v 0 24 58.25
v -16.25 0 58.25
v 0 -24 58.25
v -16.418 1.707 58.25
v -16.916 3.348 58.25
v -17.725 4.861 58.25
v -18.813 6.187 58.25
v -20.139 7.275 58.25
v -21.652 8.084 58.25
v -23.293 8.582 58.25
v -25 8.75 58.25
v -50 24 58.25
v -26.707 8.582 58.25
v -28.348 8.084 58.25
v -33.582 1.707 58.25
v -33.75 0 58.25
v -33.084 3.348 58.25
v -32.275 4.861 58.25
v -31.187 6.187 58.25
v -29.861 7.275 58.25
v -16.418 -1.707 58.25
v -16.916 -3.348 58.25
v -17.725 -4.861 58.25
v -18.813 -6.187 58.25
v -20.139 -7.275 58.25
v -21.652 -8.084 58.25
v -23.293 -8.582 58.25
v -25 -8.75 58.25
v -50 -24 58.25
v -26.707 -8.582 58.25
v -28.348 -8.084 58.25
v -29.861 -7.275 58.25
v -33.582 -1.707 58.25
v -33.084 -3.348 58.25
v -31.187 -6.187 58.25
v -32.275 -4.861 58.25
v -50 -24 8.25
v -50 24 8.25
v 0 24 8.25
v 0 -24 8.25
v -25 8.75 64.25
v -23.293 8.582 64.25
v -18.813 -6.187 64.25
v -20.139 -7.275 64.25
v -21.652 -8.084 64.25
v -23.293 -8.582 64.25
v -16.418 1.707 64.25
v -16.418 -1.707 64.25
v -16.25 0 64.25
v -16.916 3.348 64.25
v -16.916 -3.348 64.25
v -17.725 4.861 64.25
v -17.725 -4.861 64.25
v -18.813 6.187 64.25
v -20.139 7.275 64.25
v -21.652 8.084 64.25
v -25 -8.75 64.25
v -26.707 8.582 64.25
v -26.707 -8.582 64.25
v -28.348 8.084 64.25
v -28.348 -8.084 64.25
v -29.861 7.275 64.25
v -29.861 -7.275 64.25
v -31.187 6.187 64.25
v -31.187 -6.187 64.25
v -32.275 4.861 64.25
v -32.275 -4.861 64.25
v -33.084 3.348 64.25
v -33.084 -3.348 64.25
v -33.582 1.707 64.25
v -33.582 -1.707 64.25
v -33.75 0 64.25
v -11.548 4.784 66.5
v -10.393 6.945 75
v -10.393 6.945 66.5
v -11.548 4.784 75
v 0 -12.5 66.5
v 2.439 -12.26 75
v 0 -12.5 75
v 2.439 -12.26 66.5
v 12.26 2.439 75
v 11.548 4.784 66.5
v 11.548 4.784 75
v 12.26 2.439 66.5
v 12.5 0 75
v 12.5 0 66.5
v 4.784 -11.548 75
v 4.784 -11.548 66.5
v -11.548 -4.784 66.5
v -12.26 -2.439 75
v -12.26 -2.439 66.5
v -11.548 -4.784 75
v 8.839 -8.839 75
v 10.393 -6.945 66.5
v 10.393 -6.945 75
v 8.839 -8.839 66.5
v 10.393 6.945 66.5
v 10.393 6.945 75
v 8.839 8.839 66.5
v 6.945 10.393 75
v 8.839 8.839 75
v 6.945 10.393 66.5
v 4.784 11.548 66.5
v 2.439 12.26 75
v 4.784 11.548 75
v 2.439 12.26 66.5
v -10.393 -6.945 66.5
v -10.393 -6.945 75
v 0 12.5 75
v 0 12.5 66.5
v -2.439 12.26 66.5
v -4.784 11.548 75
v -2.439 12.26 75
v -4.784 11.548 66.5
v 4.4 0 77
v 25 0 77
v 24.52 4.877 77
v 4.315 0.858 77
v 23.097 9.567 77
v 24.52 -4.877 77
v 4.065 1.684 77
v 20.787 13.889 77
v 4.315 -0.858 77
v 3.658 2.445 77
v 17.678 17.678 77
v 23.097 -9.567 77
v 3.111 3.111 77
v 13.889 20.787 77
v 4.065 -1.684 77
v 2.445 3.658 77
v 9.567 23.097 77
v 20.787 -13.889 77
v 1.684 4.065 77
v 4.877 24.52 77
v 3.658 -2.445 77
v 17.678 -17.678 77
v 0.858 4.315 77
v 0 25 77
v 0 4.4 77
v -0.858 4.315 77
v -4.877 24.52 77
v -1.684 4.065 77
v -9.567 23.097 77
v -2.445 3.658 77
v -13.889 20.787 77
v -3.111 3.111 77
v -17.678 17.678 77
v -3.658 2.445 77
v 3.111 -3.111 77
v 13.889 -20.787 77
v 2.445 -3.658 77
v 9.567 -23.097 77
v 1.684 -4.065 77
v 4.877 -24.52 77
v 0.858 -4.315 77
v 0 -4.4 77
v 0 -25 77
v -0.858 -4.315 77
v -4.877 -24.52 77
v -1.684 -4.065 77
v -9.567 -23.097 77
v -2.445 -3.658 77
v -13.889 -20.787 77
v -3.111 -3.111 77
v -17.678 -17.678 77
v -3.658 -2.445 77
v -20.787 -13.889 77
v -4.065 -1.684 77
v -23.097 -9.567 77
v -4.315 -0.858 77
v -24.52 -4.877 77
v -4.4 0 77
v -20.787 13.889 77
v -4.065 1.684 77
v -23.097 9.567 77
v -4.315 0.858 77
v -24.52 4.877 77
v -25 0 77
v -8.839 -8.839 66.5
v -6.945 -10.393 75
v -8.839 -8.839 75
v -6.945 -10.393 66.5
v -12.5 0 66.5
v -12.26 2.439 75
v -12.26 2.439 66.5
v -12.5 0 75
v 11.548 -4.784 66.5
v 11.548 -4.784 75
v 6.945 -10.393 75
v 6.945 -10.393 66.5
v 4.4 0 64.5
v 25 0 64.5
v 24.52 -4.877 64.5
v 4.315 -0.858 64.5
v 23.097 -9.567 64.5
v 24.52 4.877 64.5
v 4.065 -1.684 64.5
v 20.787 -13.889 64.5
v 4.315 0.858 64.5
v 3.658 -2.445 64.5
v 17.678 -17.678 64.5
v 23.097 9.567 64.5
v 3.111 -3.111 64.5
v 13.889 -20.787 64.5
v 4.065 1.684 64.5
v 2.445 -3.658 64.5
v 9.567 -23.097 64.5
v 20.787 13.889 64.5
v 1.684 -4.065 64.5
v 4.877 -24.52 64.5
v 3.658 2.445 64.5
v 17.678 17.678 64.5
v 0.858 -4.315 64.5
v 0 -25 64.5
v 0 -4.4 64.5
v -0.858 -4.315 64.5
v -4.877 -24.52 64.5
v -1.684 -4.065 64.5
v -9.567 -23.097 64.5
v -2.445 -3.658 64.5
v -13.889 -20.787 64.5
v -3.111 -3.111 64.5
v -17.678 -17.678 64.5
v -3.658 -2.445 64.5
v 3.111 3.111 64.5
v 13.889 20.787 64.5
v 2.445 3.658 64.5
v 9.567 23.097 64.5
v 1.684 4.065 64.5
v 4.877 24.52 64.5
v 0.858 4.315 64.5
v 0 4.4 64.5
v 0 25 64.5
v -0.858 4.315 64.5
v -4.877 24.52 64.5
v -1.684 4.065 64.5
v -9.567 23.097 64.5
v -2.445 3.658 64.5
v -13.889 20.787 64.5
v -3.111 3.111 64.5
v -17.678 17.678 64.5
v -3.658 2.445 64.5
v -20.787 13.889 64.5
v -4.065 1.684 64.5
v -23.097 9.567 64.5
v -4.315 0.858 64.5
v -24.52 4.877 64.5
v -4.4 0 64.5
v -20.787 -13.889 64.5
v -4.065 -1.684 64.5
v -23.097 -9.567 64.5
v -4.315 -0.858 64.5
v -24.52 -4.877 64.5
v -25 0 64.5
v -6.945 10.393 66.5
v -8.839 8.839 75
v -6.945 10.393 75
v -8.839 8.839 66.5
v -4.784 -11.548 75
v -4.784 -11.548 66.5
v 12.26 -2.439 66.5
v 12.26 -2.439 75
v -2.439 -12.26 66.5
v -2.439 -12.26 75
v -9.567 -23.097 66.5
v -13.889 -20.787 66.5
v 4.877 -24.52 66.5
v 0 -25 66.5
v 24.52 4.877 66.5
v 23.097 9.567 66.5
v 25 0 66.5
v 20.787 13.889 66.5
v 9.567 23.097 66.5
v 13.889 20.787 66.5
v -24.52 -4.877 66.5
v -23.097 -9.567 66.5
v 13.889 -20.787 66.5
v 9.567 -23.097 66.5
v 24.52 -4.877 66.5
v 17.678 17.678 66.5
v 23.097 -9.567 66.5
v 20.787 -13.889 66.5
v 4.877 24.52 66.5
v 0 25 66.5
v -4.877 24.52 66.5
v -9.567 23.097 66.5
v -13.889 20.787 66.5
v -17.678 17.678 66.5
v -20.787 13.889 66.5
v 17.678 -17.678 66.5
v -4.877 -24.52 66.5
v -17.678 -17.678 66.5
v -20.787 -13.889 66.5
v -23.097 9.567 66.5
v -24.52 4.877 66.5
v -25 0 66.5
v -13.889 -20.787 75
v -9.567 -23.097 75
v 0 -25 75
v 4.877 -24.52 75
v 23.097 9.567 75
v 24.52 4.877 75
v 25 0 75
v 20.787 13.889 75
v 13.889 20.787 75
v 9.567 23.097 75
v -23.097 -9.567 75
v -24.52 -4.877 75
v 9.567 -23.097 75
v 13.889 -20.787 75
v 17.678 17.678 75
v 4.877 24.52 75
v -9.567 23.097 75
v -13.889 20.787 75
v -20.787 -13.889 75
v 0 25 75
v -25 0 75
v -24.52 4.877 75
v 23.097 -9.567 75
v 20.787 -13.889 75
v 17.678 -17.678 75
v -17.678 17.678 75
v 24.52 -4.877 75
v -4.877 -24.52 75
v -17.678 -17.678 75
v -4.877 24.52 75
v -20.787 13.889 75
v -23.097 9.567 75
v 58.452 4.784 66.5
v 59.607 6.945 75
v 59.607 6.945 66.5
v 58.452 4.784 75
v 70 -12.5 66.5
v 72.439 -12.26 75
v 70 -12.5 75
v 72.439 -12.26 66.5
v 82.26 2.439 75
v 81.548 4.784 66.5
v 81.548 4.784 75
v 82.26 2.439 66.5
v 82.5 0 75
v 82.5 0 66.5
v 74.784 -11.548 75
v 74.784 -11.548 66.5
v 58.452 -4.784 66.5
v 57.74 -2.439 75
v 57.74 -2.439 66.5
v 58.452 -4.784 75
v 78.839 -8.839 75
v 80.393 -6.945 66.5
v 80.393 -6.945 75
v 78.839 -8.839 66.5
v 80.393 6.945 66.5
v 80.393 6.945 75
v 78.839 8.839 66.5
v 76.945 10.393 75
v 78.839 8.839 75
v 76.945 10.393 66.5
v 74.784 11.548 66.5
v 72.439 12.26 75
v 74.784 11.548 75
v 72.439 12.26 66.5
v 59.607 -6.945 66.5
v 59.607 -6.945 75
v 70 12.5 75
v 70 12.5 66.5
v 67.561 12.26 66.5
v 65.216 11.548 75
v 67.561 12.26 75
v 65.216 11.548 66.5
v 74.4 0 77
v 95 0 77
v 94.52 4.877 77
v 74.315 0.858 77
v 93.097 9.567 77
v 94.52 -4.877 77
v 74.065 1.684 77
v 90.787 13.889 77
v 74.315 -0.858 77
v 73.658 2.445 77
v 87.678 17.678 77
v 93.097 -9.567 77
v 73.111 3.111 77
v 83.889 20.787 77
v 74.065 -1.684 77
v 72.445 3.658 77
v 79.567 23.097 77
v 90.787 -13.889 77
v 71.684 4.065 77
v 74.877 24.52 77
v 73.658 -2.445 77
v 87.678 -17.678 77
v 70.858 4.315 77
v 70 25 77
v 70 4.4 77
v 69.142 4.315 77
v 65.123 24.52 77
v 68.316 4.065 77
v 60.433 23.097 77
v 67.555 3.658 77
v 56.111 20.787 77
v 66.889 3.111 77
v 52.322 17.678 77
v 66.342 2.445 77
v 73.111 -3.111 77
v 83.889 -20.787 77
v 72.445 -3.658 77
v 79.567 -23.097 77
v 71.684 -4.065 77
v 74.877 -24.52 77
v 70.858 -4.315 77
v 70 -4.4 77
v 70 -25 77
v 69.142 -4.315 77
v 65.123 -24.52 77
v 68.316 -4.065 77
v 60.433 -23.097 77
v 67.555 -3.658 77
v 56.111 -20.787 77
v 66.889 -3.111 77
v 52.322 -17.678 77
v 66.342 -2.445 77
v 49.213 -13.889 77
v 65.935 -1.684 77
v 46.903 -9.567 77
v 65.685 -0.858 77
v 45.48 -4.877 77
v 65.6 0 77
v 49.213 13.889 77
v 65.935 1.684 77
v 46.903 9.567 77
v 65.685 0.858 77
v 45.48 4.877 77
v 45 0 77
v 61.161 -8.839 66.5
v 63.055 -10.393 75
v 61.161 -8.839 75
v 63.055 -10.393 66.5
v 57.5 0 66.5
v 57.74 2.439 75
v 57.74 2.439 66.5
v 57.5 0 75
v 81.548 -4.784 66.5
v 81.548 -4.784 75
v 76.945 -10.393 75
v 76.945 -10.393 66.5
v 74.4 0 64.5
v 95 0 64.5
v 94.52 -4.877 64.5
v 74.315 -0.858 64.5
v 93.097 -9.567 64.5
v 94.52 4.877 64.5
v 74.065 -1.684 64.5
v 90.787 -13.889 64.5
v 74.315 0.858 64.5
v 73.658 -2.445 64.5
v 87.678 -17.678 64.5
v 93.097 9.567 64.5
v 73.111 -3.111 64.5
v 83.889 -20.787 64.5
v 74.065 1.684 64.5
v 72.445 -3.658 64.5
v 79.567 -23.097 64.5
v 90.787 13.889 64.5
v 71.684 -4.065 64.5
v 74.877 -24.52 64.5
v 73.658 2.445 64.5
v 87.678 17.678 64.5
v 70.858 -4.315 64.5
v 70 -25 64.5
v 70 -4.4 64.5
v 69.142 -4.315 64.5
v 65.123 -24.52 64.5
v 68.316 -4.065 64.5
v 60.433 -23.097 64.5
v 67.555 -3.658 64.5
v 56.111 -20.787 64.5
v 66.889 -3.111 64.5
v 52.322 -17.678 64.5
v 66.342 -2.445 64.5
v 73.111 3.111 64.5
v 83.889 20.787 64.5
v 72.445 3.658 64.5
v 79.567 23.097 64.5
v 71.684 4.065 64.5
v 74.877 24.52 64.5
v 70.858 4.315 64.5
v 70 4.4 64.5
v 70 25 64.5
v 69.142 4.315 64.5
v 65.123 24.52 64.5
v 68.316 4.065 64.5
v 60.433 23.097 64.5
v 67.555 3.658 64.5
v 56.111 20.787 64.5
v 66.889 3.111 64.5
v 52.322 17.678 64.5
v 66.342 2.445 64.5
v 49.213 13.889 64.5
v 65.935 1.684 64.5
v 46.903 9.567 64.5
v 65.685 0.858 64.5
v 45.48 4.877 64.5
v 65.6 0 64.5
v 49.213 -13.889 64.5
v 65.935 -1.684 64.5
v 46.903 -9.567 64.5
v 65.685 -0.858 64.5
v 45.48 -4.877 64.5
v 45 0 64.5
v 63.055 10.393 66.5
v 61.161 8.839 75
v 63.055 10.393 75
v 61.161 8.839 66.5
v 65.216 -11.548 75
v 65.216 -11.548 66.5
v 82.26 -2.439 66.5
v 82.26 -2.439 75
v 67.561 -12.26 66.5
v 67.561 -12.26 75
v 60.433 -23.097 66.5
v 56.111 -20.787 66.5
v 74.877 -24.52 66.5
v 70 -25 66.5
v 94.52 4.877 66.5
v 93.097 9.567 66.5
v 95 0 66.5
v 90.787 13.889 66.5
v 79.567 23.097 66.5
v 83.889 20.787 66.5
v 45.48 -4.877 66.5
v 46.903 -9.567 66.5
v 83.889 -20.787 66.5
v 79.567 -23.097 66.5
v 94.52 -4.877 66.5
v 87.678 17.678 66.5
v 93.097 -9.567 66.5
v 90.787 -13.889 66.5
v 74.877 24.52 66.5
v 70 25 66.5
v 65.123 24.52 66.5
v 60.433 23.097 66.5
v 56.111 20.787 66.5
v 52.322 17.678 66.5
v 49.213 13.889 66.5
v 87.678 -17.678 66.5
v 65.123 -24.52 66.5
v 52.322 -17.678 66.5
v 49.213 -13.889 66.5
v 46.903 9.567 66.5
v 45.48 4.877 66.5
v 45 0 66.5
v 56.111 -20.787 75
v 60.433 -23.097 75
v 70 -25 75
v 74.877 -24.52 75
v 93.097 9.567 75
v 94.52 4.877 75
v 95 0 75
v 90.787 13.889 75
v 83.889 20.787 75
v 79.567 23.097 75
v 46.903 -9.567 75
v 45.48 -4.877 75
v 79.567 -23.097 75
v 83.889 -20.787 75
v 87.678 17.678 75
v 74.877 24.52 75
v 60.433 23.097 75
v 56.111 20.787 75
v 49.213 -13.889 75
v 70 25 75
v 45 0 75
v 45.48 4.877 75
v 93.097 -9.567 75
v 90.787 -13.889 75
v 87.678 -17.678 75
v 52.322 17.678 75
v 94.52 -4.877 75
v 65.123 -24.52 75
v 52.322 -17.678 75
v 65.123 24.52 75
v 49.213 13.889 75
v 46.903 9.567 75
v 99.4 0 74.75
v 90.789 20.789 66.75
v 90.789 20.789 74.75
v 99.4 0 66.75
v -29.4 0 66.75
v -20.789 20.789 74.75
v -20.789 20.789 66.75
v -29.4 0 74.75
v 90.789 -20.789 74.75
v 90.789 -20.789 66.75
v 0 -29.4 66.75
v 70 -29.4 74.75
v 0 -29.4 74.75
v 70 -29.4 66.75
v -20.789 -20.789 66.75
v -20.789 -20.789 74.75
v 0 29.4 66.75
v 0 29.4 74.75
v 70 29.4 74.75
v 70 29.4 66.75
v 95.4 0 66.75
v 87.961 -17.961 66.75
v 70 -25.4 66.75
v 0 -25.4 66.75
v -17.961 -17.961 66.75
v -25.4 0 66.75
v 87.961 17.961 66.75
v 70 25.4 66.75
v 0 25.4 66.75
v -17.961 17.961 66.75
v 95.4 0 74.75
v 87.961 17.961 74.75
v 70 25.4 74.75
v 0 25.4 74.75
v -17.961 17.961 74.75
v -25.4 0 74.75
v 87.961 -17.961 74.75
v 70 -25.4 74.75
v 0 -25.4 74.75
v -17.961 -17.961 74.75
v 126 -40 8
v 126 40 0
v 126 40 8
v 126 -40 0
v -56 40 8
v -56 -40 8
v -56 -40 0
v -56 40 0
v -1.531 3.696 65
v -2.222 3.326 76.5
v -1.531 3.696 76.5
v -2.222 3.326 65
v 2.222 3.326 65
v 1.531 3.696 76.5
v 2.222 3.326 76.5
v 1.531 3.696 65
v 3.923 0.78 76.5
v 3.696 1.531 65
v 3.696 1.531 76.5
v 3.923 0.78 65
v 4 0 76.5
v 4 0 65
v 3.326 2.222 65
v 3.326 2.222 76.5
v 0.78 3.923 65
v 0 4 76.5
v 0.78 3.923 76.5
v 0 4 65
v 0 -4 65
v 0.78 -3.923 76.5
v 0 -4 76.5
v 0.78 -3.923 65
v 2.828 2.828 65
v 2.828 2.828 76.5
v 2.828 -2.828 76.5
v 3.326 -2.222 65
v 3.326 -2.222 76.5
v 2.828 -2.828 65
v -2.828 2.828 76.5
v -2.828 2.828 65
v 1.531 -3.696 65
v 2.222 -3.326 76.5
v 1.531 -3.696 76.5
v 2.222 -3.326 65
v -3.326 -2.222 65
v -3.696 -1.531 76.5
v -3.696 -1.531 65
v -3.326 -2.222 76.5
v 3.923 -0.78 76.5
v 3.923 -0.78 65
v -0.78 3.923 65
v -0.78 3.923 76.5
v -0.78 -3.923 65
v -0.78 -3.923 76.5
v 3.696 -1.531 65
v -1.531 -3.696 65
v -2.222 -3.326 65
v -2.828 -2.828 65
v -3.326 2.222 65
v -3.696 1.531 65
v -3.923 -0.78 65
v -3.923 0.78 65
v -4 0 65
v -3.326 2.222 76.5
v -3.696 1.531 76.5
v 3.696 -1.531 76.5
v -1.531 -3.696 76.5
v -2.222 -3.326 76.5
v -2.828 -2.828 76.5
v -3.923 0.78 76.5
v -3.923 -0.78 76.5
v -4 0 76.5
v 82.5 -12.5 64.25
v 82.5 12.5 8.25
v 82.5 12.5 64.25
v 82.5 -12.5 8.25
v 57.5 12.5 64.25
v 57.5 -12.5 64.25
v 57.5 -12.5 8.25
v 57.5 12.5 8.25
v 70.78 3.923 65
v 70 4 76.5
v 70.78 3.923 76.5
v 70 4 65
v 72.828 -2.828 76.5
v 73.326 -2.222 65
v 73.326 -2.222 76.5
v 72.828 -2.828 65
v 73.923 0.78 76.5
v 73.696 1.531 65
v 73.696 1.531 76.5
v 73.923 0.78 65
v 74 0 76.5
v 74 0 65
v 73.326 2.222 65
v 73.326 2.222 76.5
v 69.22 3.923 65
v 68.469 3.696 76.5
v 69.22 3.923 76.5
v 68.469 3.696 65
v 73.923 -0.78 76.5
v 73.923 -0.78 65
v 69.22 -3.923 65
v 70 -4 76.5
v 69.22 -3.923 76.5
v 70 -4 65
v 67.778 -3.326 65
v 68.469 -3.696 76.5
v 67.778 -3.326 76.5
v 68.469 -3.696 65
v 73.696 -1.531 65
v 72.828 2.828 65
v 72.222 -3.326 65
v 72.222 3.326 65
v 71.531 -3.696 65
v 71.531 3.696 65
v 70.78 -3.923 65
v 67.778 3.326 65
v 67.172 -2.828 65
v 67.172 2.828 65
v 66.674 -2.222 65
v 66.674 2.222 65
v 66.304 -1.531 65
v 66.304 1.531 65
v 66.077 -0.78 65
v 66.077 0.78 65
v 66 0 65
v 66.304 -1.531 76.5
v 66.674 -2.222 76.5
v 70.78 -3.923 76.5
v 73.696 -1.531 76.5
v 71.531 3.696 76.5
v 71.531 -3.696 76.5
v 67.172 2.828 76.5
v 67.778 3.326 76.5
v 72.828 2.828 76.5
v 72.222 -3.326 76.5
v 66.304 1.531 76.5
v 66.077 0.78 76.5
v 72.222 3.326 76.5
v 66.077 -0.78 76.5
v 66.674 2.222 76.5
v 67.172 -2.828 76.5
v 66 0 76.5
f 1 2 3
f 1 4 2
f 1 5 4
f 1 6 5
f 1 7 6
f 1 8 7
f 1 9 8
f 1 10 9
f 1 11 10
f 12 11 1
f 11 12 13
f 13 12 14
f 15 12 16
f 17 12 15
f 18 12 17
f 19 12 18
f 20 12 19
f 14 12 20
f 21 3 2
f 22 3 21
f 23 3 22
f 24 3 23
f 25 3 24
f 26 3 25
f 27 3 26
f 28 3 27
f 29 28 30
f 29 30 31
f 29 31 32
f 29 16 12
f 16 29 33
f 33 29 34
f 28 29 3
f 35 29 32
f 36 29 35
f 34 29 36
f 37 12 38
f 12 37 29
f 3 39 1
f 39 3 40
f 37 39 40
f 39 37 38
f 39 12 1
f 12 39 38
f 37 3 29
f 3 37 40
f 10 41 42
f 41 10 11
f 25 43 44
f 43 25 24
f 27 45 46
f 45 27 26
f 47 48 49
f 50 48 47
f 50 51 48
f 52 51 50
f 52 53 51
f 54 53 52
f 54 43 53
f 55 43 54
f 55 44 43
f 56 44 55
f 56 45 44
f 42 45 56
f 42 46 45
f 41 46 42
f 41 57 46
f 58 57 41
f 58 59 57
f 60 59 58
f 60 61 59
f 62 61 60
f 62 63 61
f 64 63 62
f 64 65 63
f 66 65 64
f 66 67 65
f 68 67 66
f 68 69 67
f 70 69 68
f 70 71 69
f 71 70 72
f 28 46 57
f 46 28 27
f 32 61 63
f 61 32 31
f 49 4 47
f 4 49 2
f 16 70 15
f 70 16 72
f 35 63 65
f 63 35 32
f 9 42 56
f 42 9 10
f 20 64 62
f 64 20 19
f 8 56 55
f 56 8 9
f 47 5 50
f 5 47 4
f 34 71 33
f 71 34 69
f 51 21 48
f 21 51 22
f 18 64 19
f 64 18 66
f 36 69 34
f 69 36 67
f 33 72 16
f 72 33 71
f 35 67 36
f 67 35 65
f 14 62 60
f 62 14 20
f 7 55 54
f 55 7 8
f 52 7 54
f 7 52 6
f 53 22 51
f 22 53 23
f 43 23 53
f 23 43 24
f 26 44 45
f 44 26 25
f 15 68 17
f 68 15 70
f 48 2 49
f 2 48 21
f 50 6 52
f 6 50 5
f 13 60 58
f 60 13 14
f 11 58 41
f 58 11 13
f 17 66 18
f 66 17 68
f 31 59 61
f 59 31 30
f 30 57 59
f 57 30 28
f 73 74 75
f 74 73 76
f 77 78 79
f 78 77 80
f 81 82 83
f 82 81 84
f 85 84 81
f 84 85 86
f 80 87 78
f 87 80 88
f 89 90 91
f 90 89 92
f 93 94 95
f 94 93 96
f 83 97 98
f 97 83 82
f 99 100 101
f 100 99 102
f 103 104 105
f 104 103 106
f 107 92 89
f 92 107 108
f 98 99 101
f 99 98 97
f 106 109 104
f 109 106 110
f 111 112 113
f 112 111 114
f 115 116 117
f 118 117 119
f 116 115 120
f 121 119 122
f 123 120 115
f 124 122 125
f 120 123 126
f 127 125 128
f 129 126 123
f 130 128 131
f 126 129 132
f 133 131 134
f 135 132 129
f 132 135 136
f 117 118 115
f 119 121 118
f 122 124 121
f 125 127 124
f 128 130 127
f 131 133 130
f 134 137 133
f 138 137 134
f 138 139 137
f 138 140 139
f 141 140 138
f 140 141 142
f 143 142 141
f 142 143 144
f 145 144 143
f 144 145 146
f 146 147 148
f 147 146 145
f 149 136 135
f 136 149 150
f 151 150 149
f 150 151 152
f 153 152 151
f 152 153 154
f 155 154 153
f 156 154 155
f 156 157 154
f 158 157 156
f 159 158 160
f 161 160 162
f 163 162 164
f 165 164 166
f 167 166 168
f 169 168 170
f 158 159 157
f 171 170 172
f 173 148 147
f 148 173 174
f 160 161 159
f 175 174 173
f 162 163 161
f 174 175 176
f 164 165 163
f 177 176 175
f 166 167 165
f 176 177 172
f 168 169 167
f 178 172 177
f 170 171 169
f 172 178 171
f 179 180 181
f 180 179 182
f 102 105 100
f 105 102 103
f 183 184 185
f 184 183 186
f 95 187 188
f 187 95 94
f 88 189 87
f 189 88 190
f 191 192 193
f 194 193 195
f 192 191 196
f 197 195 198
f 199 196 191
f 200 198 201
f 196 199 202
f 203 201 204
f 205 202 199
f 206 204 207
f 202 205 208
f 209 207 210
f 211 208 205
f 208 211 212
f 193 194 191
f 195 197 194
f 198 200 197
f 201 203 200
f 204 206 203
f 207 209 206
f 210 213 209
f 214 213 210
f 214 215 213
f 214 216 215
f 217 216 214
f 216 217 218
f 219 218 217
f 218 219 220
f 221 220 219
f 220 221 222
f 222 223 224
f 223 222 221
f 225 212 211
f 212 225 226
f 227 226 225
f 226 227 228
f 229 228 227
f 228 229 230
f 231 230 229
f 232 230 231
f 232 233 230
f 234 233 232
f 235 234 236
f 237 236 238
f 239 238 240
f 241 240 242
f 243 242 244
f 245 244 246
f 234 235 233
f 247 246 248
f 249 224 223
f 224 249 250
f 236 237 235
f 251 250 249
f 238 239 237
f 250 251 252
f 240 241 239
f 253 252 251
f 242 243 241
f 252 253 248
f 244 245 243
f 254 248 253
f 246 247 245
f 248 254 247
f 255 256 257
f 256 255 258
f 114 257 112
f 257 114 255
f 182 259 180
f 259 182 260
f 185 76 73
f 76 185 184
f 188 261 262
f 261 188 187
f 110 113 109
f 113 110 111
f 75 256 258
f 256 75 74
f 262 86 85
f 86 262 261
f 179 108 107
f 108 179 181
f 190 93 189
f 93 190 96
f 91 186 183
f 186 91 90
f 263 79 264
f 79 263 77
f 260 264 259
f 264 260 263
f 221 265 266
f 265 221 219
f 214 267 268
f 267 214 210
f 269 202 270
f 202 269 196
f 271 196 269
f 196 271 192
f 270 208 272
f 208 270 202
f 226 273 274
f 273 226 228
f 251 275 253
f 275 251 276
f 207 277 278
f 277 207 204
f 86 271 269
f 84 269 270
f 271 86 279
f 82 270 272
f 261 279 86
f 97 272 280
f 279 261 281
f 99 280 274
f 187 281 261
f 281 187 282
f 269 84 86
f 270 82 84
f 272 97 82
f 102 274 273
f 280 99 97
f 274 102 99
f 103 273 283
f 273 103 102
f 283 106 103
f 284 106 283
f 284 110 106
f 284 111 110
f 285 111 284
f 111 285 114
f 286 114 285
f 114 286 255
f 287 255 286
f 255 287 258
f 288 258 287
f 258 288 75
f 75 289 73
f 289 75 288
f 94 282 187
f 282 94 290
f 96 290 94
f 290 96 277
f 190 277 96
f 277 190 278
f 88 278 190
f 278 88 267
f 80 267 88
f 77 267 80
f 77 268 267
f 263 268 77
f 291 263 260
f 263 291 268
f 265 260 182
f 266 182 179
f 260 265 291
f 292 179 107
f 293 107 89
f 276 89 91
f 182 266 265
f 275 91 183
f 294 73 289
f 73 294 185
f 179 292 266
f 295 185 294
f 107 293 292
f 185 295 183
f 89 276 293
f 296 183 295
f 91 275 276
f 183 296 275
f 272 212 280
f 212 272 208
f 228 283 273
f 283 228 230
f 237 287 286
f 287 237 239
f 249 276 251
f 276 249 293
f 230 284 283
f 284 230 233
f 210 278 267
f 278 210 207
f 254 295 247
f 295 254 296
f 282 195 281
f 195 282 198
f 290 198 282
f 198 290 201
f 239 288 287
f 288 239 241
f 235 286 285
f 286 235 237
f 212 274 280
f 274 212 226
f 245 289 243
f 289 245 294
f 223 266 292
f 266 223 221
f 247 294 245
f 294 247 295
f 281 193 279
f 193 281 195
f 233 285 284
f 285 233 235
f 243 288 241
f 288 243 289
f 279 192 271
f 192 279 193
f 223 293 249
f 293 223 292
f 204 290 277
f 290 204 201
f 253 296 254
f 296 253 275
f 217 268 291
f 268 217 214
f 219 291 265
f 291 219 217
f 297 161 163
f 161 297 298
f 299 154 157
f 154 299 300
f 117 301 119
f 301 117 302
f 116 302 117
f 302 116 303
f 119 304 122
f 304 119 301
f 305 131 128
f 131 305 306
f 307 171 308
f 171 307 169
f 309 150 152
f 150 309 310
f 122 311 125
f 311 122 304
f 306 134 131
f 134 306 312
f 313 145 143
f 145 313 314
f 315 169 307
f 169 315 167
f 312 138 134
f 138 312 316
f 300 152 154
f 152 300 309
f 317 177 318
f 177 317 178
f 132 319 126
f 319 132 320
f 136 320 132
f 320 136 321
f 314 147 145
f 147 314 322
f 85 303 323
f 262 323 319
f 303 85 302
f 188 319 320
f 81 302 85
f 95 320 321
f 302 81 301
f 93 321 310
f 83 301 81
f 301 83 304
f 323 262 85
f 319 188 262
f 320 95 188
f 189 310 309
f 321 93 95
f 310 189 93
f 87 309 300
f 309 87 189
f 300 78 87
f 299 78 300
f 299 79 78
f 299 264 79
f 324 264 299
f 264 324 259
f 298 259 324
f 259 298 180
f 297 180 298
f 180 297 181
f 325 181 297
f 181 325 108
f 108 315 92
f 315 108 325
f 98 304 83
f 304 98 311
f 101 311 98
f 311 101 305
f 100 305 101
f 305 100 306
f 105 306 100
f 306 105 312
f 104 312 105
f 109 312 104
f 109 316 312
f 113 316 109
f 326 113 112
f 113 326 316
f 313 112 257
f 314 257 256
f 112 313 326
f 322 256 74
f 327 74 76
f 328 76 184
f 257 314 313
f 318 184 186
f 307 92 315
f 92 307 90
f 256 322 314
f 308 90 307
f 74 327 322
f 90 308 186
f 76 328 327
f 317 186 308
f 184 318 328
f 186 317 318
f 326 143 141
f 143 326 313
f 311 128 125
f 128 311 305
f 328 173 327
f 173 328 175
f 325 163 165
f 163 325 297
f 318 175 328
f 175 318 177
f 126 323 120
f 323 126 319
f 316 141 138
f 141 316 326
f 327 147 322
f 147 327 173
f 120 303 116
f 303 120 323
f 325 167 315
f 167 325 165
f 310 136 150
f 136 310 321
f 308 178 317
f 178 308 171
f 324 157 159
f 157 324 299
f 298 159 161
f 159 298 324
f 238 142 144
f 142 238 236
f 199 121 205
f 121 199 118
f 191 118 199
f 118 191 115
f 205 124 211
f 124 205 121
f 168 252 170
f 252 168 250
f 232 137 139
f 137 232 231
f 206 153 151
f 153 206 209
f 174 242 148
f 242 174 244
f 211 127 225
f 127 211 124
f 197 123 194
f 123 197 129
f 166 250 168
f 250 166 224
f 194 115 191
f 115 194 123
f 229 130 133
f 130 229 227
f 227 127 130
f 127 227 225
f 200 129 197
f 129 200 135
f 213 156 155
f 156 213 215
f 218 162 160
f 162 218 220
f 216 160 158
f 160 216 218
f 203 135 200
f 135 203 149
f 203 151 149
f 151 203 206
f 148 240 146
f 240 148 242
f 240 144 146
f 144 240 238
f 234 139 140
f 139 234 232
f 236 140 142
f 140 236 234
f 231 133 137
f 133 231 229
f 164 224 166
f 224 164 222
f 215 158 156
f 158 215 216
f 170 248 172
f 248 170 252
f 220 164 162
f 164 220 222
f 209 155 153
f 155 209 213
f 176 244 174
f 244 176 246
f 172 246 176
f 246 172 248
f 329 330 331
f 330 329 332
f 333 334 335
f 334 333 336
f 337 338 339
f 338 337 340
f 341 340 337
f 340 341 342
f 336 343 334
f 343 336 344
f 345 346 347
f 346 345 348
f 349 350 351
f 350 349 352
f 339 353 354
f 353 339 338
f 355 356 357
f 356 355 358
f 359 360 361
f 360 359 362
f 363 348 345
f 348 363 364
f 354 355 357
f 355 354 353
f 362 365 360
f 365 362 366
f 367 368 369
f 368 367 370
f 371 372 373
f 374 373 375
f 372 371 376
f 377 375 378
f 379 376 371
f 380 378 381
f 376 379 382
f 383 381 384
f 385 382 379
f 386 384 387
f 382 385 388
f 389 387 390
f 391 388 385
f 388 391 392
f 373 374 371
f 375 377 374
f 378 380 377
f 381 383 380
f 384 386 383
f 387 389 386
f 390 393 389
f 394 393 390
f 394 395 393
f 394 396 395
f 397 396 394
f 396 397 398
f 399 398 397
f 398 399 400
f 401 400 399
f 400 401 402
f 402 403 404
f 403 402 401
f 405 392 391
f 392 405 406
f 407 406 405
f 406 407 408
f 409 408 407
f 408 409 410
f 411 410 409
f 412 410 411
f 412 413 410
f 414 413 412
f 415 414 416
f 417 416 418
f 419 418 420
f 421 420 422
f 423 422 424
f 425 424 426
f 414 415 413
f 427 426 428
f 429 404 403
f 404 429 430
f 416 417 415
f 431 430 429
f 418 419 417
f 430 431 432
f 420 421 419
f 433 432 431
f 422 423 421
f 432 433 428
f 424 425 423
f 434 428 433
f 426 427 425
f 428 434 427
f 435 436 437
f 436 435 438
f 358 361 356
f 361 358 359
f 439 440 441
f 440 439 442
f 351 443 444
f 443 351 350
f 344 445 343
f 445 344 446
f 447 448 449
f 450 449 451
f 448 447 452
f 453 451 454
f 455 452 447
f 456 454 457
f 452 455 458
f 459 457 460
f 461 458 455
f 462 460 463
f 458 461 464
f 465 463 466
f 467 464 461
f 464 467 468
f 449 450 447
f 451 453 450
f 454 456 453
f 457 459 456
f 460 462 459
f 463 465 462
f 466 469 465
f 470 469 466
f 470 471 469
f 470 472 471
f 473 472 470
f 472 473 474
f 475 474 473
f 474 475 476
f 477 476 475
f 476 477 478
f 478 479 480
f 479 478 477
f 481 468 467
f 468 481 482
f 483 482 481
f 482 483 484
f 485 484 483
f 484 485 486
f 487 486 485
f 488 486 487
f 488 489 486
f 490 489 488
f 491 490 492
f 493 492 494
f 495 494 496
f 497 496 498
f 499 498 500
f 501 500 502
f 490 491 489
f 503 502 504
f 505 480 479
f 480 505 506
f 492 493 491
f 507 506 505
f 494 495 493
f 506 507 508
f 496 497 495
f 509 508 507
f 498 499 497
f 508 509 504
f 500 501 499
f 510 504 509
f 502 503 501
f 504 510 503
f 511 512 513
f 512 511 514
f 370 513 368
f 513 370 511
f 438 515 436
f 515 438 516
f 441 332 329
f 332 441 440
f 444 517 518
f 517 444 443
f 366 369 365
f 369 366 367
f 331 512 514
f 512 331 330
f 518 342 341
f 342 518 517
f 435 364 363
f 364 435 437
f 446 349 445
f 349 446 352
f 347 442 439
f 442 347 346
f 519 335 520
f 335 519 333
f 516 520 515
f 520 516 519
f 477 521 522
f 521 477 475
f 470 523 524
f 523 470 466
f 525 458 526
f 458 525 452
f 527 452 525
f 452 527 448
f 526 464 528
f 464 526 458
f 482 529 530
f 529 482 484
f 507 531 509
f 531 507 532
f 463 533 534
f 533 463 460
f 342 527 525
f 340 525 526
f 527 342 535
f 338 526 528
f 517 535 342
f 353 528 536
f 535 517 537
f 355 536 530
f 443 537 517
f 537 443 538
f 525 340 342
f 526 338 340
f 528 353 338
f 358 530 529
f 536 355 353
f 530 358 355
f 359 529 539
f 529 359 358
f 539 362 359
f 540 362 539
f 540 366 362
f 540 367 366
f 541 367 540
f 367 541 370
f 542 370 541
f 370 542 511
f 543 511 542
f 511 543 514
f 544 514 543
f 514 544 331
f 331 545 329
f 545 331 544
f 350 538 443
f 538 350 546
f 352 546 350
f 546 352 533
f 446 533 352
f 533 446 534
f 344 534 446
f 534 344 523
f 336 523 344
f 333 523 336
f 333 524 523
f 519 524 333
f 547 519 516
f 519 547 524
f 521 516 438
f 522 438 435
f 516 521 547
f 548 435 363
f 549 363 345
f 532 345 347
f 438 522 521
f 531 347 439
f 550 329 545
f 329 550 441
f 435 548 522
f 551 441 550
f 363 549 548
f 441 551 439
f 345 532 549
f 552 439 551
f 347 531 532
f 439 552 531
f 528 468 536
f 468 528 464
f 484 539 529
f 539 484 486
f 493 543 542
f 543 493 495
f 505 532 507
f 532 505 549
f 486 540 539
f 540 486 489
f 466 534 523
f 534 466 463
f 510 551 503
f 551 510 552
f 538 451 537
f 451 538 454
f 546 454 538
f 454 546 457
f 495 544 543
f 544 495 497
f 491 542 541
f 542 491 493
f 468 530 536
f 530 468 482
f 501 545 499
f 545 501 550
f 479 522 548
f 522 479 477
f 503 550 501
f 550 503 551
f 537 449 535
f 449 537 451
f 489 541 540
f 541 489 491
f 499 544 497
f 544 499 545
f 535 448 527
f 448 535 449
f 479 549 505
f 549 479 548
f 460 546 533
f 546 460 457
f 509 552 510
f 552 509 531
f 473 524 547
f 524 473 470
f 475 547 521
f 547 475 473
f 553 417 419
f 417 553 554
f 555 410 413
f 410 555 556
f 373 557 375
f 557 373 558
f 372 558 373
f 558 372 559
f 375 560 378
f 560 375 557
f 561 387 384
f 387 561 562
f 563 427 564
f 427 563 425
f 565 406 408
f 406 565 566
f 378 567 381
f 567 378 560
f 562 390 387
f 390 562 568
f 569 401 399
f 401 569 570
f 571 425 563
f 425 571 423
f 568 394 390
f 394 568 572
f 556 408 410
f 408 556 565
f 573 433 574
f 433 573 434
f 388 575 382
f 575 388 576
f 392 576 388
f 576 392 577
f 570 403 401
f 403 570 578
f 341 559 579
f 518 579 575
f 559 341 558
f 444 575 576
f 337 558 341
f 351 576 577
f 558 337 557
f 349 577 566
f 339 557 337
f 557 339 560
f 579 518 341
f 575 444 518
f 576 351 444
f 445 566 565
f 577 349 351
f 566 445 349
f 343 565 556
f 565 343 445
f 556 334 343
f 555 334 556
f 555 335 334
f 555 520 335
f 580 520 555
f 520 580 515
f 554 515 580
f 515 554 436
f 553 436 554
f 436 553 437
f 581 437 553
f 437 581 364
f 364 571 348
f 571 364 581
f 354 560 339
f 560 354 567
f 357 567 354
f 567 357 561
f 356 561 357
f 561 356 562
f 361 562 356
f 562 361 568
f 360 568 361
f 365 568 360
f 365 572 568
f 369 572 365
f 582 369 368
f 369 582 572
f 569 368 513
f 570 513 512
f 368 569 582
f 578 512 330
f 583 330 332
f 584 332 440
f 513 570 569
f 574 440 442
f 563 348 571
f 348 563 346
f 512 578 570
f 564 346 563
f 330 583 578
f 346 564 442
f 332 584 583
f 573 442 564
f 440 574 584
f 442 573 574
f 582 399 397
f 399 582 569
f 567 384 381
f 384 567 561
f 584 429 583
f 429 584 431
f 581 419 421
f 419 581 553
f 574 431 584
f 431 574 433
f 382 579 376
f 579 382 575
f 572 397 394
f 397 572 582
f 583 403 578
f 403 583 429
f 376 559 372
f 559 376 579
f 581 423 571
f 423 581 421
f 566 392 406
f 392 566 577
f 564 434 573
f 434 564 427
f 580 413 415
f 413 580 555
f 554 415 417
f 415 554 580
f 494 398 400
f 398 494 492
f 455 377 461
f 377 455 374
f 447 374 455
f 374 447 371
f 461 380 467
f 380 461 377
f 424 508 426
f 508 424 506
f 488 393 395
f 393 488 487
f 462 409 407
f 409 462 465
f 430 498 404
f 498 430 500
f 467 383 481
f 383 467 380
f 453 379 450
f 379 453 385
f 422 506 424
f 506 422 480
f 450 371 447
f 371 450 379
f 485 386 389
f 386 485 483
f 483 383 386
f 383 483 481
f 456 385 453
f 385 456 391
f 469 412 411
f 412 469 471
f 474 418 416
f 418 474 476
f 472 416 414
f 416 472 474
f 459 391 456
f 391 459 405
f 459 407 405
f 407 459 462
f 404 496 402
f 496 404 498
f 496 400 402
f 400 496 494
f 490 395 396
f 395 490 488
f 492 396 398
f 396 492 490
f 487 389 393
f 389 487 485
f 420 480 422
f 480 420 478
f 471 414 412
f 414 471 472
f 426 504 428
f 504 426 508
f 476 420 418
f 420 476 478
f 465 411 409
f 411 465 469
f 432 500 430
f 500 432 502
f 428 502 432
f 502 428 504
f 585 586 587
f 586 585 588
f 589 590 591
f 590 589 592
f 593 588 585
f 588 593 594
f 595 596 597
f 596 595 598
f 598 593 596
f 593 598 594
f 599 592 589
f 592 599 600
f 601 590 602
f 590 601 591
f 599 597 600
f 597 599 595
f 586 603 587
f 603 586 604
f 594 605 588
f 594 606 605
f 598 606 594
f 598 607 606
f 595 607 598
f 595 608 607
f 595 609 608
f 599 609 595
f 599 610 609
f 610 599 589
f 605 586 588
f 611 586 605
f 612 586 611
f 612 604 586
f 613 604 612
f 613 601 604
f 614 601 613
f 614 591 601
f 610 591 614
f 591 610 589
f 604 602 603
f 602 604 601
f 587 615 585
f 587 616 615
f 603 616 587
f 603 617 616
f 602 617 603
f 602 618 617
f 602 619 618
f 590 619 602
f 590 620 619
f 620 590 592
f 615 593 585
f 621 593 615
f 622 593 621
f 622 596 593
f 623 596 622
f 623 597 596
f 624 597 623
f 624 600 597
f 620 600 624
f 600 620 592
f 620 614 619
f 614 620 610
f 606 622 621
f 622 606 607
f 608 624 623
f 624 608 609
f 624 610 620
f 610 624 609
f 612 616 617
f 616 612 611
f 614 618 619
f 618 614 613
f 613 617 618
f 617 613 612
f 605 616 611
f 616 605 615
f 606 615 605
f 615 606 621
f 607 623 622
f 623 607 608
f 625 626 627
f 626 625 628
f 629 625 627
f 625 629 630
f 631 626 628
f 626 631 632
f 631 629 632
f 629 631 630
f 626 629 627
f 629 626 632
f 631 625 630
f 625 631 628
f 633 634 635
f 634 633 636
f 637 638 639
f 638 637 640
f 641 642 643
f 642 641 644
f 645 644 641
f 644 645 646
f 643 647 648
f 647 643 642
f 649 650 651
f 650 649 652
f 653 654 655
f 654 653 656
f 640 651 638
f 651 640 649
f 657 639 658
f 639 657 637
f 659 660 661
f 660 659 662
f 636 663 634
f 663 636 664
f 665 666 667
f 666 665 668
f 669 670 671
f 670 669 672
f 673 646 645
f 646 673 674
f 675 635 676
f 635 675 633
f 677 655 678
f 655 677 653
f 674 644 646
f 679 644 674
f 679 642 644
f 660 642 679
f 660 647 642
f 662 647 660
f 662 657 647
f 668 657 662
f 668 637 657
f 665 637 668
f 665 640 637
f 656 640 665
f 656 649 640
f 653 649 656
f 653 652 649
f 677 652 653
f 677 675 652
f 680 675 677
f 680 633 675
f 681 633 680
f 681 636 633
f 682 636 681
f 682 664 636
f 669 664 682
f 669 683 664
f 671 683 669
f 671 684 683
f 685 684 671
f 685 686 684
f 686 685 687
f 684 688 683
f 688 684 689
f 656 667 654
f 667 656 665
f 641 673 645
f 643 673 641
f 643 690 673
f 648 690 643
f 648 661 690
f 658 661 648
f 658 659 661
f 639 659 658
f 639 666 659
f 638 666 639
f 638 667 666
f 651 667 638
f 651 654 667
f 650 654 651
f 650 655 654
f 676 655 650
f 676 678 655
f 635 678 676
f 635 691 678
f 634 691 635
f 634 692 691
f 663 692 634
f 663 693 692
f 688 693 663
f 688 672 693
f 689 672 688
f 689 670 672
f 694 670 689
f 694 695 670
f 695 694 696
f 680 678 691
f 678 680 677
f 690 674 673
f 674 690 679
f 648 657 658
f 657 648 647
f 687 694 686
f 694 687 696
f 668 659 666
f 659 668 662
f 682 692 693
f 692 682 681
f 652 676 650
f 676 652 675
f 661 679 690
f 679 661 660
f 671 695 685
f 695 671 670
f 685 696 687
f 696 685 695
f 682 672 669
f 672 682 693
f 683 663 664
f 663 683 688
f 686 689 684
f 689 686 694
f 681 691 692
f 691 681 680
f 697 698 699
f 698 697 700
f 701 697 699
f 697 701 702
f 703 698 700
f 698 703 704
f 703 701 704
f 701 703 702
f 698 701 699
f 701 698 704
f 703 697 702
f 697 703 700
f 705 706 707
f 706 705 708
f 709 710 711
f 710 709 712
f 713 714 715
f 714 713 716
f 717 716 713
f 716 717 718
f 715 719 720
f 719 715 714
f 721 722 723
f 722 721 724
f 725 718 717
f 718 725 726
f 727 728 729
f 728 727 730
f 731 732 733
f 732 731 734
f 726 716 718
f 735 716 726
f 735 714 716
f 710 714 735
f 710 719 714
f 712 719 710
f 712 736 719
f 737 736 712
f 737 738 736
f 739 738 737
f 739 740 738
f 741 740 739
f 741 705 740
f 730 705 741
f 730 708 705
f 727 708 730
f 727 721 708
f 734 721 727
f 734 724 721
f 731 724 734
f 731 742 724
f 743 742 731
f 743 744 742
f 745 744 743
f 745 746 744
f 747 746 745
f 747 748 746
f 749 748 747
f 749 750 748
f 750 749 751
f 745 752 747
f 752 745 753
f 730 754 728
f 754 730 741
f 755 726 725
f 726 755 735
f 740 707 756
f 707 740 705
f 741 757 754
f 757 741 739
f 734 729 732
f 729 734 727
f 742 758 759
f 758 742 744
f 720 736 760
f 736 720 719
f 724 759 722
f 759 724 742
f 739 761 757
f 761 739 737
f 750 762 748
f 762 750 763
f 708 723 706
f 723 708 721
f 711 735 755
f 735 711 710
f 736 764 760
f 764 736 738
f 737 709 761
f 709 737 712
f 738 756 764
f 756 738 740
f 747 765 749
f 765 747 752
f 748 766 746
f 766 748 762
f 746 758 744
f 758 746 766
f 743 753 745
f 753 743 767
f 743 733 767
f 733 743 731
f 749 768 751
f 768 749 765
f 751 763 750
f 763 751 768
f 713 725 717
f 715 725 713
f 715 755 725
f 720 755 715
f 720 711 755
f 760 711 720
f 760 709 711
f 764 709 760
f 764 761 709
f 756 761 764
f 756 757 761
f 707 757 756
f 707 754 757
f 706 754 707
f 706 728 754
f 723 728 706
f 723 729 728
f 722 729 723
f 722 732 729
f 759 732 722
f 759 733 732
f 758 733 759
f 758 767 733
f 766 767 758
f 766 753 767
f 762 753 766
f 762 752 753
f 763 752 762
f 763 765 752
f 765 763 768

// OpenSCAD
$fn = 32;

// ------------------------------------------------------------------------
// Motor belt drive: span 70 mm, pulleys d50, belt 8 mm wide
// Every part is its own module, assembly() places every instance.
// ------------------------------------------------------------------------

// --- part 1 ---
module base_plate() {
  difference() {
    translate([-91, -40, 0]) cube([182, 80, 8]);
  }
}

// --- part 2 ---
module motor() {
  union() {
    translate([-25, -24, 0]) cube([50, 48, 50]);
    translate([28, 0, 25]) rotate([0, 90, 0]) cylinder(h = 6, d = 17.5, center = true);
  }
}

// --- part 3 ---
module drive_shaft() {
  translate([0, 0, -5.75]) cylinder(h = 11.5, d = 8);
}

// --- part 4 ---
module pulley_drive() {
  difference() {
    union() {
      cylinder(h = 12.5, d = 25);
      cylinder(h = 2, d = 50);
      translate([0, 0, 10.5]) cylinder(h = 2, d = 50);
    }
    translate([0, 0, -1]) cylinder(h = 14.5, d = 8.8);
  }
}

// --- part 5 ---
module idler_post() {
  translate([-12.5, -12.5, 0]) cube([25, 25, 56]);
}

// --- part 6 ---
module driven_shaft() {
  translate([0, 0, -5.75]) cylinder(h = 11.5, d = 8);
}

// --- part 7 ---
module pulley_driven() {
  difference() {
    union() {
      cylinder(h = 12.5, d = 25);
      cylinder(h = 2, d = 50);
      translate([0, 0, 10.5]) cylinder(h = 2, d = 50);
    }
    translate([0, 0, -1]) cylinder(h = 14.5, d = 8.8);
  }
}

// --- part 8 ---
module drive_belt() {
  difference() {
    linear_extrude(height = 8) polygon(points = concat([for (a = [90 : 45 : 270]) [29.4 * cos(a), 29.4 * sin(a)]], [for (a = [270 : 45 : 450]) [70 + 29.4 * cos(a), 29.4 * sin(a)]]));
    translate([0, 0, -1]) linear_extrude(height = 10) polygon(points = concat([for (a = [90 : 45 : 270]) [25.4 * cos(a), 25.4 * sin(a)]], [for (a = [270 : 45 : 450]) [70 + 25.4 * cos(a), 25.4 * sin(a)]]));
  }
}

// --- assembly ---
module assembly() {
  color([0.80, 0.24, 0.20]) translate([35, 0, 0]) rotate([0, 0, 0]) base_plate();
  color([0.20, 0.45, 0.75]) translate([0, 0, 33.25]) rotate([0, 270, 0]) motor();
  color([0.25, 0.62, 0.32]) translate([0, 0, 70.75]) rotate([0, 0, 0]) drive_shaft();
  color([0.92, 0.70, 0.18]) translate([0, 0, 64.5]) rotate([0, 0, 0]) pulley_drive();
  color([0.58, 0.35, 0.70]) translate([70, 0, 8.25]) rotate([0, 0, 0]) idler_post();
  color([0.16, 0.66, 0.66]) translate([70, 0, 70.75]) rotate([0, 0, 0]) driven_shaft();
  color([0.85, 0.48, 0.18]) translate([70, 0, 64.5]) rotate([0, 0, 0]) pulley_driven();
  color([0.55, 0.60, 0.65]) translate([0, 0, 66.75]) rotate([0, 0, 0]) drive_belt();
}

assembly();
